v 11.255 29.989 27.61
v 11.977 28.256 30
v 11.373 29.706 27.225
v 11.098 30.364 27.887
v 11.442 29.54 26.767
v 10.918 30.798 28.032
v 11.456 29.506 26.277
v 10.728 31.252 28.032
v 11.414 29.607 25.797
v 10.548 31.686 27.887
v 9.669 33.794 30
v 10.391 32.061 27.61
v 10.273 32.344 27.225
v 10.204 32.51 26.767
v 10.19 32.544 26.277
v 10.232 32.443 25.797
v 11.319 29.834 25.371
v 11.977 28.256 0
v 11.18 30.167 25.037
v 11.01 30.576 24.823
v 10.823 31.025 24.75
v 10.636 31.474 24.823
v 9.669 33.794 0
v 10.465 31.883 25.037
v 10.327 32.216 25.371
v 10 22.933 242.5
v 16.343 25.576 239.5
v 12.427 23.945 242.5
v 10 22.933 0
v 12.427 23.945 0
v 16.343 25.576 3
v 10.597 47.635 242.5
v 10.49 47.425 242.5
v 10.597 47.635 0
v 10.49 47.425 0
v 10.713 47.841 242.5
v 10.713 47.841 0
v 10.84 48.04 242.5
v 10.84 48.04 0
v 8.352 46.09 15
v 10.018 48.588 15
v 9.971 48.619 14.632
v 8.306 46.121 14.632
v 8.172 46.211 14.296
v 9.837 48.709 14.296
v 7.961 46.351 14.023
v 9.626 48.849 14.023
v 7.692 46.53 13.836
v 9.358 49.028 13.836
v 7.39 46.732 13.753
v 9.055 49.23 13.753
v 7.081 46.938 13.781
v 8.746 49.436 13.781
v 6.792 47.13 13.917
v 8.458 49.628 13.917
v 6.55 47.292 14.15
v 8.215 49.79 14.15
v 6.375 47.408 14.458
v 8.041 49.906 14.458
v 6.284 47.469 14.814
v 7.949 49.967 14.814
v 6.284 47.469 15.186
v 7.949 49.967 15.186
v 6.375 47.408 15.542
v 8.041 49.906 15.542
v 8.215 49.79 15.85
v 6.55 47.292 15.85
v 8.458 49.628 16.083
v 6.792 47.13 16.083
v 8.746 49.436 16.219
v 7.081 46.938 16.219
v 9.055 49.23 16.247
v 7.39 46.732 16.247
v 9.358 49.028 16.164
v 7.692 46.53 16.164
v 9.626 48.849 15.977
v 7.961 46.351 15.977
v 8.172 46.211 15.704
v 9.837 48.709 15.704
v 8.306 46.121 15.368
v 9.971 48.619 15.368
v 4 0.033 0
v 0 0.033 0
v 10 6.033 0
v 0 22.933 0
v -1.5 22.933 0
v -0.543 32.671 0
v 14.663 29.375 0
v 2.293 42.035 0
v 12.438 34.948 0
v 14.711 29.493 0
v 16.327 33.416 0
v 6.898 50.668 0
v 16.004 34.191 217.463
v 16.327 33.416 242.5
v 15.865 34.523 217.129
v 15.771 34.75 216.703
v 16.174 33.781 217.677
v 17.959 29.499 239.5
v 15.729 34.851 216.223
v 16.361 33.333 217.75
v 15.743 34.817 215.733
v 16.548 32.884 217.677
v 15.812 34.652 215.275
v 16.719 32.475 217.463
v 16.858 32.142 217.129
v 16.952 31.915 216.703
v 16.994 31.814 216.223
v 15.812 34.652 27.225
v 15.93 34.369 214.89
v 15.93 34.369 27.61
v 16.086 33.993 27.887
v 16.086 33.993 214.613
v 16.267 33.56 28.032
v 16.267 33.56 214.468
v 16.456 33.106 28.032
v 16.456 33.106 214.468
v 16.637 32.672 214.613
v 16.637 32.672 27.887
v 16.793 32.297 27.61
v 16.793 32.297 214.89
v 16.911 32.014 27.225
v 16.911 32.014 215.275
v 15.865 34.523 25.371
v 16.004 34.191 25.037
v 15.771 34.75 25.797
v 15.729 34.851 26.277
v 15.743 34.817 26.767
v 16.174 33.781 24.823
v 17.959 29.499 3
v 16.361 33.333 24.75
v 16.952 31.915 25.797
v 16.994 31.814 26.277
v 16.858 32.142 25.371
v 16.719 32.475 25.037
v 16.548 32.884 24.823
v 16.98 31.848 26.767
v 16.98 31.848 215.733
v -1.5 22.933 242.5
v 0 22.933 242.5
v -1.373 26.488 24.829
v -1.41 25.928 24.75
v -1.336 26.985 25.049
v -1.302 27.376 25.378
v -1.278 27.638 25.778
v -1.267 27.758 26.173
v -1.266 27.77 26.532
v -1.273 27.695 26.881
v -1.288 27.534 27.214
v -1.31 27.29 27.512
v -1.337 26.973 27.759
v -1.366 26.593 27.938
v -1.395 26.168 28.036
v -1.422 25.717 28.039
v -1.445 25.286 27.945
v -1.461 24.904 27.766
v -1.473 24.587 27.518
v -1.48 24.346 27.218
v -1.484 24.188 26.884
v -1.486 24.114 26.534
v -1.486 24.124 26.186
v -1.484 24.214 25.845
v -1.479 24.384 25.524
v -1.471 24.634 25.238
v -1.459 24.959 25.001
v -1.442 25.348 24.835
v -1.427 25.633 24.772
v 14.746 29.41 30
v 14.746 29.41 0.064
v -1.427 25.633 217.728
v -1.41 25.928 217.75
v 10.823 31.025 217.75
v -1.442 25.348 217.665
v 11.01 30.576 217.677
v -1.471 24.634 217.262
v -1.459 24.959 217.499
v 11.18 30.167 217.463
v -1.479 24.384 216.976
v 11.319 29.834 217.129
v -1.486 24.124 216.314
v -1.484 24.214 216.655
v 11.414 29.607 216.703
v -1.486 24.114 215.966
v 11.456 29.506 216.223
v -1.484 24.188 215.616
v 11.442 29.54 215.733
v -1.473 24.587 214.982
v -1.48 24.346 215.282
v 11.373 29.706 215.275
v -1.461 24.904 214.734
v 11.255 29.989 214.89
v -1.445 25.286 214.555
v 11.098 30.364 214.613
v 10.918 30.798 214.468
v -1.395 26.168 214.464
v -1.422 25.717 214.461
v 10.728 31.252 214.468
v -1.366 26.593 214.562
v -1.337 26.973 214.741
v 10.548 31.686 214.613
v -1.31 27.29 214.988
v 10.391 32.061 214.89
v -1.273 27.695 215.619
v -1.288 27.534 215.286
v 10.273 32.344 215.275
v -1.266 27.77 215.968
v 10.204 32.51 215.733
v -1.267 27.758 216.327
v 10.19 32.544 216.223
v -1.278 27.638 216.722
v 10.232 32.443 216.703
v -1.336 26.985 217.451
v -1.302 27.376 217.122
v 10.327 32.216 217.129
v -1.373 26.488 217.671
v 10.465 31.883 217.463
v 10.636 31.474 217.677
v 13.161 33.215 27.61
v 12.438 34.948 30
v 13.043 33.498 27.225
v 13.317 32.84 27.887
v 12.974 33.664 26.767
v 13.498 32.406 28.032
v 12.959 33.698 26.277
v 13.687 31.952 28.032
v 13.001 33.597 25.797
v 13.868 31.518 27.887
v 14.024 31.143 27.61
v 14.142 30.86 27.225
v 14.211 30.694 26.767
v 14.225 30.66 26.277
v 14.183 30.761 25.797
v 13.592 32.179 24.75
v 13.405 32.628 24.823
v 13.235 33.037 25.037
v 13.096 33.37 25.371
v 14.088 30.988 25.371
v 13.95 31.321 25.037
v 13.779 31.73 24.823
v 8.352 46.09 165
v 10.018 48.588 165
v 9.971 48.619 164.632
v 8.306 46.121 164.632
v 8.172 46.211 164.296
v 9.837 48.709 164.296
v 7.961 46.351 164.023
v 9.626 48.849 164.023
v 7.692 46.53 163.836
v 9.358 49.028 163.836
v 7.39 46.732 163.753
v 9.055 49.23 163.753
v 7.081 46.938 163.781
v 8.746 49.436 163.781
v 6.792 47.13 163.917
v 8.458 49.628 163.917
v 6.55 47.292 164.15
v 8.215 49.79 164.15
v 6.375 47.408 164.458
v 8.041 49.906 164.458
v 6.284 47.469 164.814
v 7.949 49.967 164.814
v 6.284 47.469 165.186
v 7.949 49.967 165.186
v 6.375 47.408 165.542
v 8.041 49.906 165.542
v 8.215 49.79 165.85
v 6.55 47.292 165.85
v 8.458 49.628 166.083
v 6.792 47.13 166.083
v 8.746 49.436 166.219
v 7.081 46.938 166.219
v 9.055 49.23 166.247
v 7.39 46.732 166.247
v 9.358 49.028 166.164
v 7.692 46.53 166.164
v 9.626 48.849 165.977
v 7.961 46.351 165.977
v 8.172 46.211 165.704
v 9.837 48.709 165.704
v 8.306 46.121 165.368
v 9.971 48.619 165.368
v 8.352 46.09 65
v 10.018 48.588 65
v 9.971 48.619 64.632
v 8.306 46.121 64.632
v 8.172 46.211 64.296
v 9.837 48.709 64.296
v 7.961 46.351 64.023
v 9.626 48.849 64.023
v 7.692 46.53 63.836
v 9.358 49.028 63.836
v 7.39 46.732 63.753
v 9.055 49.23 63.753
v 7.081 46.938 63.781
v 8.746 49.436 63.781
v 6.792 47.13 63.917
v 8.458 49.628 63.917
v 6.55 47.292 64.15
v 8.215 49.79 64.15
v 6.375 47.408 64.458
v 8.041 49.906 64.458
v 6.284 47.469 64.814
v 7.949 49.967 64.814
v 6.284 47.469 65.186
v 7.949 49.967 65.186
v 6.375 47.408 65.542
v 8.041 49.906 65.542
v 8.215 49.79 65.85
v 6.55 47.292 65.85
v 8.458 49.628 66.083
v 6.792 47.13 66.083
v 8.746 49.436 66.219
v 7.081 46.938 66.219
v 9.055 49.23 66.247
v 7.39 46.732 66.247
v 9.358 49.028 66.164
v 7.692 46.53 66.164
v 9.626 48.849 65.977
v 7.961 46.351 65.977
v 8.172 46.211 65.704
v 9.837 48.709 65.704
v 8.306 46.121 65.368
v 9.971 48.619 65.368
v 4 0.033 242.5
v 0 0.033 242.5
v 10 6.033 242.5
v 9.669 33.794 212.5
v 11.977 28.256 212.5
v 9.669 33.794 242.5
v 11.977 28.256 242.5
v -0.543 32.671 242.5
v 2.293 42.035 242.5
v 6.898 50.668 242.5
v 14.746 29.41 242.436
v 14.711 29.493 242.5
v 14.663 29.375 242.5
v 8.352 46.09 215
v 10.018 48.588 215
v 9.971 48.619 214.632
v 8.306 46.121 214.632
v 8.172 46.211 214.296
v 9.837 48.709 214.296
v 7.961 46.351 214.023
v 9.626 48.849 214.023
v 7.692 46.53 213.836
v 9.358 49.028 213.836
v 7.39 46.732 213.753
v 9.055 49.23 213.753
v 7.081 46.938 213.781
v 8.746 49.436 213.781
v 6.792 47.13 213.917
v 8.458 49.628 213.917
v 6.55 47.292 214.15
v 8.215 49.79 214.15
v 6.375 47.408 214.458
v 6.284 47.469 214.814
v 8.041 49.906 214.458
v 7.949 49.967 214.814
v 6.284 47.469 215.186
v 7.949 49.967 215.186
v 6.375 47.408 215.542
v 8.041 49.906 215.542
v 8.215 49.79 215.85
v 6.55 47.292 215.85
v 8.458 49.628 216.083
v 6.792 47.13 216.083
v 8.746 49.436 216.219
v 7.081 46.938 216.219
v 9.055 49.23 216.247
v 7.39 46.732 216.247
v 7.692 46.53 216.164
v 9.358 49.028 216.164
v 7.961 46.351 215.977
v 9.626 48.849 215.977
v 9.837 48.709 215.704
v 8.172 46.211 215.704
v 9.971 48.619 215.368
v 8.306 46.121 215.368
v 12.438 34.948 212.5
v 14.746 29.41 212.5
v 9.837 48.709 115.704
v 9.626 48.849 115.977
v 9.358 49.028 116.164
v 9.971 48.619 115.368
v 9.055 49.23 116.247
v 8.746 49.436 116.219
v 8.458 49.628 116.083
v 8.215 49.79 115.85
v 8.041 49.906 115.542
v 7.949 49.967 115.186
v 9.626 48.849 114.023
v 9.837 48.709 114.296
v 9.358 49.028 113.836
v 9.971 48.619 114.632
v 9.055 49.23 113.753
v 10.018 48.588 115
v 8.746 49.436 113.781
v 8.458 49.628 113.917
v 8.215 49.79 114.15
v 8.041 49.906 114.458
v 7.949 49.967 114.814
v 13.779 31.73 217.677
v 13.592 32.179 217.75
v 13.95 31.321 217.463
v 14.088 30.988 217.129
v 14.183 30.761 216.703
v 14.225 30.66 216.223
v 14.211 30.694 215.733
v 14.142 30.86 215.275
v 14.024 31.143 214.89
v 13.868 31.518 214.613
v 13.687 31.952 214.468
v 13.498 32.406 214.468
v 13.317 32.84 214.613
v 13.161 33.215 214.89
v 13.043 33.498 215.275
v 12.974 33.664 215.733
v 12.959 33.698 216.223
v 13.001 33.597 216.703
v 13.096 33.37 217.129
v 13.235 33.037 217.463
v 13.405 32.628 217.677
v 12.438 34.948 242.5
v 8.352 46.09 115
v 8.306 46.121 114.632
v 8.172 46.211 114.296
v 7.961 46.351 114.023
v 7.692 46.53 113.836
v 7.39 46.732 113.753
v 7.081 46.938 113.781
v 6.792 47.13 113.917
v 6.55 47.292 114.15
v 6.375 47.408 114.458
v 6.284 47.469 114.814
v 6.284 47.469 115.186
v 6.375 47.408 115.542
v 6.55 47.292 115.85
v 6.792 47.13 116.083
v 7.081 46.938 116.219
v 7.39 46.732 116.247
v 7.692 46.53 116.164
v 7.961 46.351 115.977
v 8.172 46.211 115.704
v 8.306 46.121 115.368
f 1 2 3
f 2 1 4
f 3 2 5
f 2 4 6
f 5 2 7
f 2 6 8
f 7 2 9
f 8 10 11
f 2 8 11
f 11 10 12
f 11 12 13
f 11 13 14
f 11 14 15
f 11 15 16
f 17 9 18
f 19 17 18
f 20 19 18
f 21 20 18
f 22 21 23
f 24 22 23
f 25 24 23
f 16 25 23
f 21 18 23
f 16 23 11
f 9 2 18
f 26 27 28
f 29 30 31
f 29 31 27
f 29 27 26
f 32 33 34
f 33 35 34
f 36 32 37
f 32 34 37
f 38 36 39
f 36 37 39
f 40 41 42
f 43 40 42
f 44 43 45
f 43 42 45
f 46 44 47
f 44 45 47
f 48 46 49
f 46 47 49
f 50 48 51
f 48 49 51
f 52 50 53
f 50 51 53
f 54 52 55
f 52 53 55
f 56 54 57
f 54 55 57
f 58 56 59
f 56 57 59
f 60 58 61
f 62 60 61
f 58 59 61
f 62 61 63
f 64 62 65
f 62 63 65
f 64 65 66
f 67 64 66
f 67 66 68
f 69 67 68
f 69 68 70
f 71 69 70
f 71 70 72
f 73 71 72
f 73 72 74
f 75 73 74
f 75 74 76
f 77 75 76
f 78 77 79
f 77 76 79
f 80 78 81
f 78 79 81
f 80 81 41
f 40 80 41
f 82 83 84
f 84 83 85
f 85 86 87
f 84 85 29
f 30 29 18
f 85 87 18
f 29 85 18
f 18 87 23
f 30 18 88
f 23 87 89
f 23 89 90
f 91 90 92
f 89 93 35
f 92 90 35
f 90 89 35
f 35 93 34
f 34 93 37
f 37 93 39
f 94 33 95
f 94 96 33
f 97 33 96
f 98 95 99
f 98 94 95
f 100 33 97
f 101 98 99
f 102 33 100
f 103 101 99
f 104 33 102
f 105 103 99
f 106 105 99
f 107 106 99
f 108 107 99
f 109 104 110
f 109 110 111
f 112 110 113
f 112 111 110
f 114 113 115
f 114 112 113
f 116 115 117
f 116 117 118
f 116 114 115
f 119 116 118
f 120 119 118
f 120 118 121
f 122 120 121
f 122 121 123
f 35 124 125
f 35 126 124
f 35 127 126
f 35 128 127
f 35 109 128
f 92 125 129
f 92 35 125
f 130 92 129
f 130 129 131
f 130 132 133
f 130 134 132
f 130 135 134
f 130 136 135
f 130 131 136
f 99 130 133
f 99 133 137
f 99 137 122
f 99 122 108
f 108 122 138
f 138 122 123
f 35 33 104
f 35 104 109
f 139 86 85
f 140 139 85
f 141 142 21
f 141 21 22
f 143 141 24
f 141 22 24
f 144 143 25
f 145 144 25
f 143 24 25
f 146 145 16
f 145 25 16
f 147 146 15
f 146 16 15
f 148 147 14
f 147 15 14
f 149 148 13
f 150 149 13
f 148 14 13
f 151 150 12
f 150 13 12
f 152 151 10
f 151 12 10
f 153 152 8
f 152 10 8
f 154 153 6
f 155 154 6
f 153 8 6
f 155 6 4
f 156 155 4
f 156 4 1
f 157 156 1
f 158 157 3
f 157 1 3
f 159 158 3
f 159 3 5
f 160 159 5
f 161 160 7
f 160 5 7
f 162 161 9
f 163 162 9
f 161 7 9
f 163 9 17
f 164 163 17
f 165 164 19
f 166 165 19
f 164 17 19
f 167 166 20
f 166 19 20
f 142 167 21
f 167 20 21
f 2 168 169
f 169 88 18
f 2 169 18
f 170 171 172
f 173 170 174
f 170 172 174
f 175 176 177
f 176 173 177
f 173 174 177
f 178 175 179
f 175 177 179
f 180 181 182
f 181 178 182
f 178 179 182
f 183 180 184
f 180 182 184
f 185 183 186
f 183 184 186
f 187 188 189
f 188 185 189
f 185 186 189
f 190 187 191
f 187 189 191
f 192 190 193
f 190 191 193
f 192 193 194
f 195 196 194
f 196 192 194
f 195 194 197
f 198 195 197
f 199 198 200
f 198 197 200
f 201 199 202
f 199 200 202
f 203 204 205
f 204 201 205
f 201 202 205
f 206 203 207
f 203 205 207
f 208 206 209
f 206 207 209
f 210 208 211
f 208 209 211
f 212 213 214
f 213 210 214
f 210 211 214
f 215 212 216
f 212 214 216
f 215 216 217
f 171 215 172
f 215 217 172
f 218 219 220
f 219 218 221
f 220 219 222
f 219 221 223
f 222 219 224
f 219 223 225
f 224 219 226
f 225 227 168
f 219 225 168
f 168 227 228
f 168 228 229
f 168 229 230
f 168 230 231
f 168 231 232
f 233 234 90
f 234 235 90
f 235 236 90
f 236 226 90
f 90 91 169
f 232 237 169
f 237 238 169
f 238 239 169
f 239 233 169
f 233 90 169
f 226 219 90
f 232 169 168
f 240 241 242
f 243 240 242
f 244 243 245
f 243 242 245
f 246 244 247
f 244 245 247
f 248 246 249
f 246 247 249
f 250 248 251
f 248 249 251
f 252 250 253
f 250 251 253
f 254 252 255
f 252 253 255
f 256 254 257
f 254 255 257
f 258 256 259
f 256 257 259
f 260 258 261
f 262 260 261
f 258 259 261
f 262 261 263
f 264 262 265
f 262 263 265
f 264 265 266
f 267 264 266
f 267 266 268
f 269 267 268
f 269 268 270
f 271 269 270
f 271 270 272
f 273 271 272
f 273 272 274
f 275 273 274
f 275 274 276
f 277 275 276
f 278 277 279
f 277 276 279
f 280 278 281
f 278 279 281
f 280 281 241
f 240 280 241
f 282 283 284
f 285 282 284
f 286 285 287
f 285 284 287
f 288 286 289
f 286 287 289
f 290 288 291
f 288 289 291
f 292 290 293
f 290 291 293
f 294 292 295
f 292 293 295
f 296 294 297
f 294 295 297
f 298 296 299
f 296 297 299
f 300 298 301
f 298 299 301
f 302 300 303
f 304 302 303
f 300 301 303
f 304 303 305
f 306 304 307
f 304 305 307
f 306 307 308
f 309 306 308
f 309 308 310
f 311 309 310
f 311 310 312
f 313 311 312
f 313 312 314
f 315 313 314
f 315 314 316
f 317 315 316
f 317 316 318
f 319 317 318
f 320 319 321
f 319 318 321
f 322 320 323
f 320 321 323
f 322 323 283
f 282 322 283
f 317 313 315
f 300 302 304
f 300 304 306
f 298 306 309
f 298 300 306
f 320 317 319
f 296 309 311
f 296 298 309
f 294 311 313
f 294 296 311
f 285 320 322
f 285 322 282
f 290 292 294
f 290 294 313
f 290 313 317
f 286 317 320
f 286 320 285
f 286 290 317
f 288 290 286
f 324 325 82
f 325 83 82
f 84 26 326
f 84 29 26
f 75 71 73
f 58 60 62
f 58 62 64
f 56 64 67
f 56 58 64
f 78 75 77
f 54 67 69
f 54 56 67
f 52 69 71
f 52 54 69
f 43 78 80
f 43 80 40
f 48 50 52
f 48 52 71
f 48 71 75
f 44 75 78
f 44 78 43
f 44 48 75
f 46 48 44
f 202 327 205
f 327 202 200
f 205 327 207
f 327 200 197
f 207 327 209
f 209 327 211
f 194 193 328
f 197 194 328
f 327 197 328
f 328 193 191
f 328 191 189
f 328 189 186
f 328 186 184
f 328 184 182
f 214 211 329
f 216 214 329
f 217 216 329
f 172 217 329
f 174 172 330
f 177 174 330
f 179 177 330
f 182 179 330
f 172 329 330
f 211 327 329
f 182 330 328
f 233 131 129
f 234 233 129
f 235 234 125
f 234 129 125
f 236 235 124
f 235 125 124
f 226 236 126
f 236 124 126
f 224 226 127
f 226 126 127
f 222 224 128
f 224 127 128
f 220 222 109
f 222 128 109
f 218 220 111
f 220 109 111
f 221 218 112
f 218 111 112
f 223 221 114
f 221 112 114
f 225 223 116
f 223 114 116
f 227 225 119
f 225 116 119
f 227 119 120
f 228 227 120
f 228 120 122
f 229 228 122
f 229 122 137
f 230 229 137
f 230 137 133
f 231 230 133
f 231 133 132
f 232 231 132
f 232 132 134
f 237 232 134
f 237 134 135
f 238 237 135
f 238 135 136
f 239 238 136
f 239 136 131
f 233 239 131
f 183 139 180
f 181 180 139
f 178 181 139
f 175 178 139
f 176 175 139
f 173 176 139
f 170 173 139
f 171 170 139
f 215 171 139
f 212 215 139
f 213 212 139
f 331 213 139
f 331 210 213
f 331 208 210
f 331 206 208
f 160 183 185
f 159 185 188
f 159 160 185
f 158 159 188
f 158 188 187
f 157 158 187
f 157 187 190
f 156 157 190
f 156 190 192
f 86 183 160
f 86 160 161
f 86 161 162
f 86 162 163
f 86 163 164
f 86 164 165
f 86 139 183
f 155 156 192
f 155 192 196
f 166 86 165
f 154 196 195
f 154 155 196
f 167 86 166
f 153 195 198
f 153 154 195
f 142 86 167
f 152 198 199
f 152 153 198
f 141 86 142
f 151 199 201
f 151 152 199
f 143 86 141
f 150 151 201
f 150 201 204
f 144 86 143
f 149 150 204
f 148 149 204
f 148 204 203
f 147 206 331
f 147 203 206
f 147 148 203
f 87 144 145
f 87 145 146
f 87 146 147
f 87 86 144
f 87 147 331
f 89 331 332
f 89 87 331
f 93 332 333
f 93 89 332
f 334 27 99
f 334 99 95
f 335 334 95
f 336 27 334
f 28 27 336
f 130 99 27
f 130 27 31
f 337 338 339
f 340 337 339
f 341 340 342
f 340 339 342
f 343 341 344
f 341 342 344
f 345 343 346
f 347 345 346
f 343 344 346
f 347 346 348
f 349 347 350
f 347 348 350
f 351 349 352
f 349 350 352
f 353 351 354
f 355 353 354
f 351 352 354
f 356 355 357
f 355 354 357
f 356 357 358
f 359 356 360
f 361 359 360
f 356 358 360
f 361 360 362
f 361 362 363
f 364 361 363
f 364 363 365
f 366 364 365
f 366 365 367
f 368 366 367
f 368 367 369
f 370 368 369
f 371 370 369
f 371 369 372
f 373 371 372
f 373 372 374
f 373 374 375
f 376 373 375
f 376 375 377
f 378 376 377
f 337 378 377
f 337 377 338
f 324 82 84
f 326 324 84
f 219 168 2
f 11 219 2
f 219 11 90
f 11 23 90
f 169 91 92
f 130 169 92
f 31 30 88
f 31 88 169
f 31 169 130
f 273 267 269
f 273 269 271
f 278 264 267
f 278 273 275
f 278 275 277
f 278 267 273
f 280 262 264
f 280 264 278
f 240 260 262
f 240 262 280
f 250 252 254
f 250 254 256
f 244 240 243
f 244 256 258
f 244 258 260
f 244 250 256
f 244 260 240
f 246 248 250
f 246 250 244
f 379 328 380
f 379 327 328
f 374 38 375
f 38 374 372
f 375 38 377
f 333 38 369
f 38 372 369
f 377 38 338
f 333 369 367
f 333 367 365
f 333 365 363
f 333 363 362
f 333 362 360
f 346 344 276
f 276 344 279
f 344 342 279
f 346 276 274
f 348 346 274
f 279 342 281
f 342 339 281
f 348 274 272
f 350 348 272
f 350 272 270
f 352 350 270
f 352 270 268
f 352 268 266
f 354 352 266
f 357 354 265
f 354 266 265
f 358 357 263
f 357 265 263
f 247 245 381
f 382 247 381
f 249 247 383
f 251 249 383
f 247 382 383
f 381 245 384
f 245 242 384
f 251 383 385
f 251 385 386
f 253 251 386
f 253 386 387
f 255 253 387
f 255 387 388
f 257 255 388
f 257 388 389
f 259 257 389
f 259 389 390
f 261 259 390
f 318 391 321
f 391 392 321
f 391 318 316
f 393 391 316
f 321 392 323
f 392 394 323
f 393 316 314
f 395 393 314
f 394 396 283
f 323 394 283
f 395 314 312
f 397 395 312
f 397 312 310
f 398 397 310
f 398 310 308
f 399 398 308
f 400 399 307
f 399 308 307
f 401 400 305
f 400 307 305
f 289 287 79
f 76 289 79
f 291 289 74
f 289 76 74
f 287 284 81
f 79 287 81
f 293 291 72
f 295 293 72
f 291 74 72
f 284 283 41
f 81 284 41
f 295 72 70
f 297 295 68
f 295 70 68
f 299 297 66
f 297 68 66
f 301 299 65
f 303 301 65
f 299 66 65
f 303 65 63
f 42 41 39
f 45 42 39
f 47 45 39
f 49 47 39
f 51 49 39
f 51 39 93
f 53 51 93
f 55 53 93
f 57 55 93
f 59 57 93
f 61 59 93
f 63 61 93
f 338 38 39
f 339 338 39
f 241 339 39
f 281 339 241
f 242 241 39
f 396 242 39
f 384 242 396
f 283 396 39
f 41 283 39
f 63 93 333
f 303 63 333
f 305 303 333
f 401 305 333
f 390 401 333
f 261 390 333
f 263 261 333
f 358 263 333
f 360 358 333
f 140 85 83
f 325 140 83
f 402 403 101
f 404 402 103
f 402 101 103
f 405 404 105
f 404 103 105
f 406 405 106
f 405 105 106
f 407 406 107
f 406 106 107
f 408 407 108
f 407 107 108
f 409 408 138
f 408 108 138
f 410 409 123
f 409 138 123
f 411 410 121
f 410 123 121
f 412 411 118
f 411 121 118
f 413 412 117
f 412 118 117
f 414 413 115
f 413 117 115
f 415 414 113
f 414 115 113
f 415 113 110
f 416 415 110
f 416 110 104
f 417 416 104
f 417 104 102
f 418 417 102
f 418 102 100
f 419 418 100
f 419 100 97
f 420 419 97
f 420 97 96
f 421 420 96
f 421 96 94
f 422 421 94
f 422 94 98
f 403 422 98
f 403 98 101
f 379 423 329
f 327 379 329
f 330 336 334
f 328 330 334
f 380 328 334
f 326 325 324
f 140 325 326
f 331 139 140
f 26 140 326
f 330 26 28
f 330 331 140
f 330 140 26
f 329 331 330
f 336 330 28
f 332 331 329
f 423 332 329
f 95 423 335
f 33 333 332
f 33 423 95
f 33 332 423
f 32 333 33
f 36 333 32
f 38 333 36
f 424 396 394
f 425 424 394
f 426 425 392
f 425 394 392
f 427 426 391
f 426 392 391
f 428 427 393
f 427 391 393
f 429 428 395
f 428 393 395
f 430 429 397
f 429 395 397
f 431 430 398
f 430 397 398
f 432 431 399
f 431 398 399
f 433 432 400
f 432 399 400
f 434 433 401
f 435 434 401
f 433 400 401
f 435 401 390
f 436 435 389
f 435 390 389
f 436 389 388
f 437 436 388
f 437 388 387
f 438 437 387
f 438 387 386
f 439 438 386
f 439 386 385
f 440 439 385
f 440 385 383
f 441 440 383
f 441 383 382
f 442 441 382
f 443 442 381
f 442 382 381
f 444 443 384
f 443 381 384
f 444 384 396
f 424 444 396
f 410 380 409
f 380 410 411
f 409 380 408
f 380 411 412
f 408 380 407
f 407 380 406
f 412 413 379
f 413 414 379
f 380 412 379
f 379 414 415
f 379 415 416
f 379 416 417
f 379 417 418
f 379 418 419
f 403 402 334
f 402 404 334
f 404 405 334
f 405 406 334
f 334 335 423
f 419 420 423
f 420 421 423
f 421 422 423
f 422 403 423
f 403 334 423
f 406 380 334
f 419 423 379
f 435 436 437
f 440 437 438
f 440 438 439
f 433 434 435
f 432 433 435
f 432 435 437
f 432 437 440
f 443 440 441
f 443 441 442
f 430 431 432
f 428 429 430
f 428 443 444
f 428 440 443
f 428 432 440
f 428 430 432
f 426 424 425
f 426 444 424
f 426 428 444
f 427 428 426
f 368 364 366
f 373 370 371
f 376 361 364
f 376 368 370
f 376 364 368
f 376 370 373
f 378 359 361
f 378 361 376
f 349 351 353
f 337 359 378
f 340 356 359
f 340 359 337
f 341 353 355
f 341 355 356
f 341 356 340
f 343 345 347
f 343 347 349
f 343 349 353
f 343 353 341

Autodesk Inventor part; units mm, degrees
ref_plane "YZ Plane" through (0, 0, 0) normal (1, 0, 0) x (0, 1, 0)
ref_plane "Work Plane1" through (0, 0, 0) normal (0, 0, 1) x (1, 0, 0)
sketch "Sketch1" plane through (0, 0, 0) normal (0, 0, 1) x (1, 0, 0)
  line L0 (10, 0) -> (-1.5, 0) projected
  line L1 (10, 45.2667) -> (10, 0) projected
  arc A0 (13.0769, 49.8821) -> (10, 45.2667) centre (15, 45.2667) ccw projected
  line L2 (54.8615, 67.2923) -> (13.0769, 49.8821) projected
  line L3 (50.4385, 77.9077) -> (54.8615, 67.2923) projected
  line L4 (50.4385, 77.9077) -> (29.2692, 69.0872) projected
  arc A1 (29.2692, 69.0872) -> (-1.5, 22.9333) centre (48.5, 22.9333) ccw projected
  line L5 (-1.5, 0) -> (-1.5, 22.9333) projected
  line L6 (15, 45.2667) -> (6.8975, 50.6683)
  line L7 (10, 48.6) -> (19.7692, 25.1538) projected
  line L8 (35.4, 31.6667) -> (10, 21.0833) projected
  line L9 (19.1124, 26.7302) -> (10, 22.9333)
  line L10 (-1.5, 22.9333) -> (10, 22.9333)
  line L11 (-1.5, 22.9333) -> (0, 22.9333)
  line L12 (0, 22.9333) -> (0, -23.4445)
  line L13 (0, -23.4445) -> (-1.5, -23.4445)
  line L14 (-1.5, -23.4445) -> (-1.5, 22.9333)
  line L15 (0, 0.0333) -> (4, 0.0333)
  line L16 (4, 0.0333) -> (10, 6.0333)
  point P0 (0, 0)
  point P1 (10.4897, 47.4247)
  point P2 (10.8397, 48.0402)
  point P3 (10, 48.6)
  point P4 (0, 22.9333)
  dimension "d3" = 1.5
  dimension "d4" = 4
  dimension "d5" = 45
  dimension "d6" = 22.9
extrude "Extrusion1" add sketch "Sketch1" along normal blind 242.5 contours L16 L15 L12 L10 L1 | A1 L6 L7 A0 L1 L10 | L1 A0 L7 L9 | L6 A0 L7
sketch "Sketch2" plane through (6.8975, 50.6683, 242.5) normal (0.5547002, 0.8320503, 0) x (0.8320503, -0.5547002, 0)
  line L0 (4.738, 242.5) -> (0, 242.5) projected
  line L1 (0, 242.5) -> (0, 0) projected
  line L2 (4.738, 0) -> (0, 0) projected
  line L3 (4.738, 242.5) -> (4.738, 0) projected
  circle A0 centre (2.5, 227.5) radius 1.25
  circle A1 centre (2.5, 177.5) radius 1.25
  circle A2 centre (2.5, 127.5) radius 1.25
  circle A3 centre (2.5, 77.5) radius 1.25
  circle A4 centre (2.5, 27.5) radius 1.25
  point P0 (22.3667, 242.5)
  dimension "d7" = 2.5
  dimension "d8" = 2.5
  dimension "d9" = 15
  dimension "d12" = 50
extrude "Extrusion2" cut sketch "Sketch2" against normal blind 3 contours A0 | A1 | A2 | A3 | A4
sketch "Sketch3" plane through (0, 0, 0) normal (0, 0, -1) x (-1, 0, 0)
  line L0 (-10, 6.0333) -> (-10, 22.9333) projected
  line L1 (-4, 0.0333) -> (-10, 6.0333) projected
  line L2 (0, 0.0333) -> (-4, 0.0333) projected
  line L3 (0, 22.9333) -> (0, 0.0333) projected
  line L4 (1.5, 22.9333) -> (0, 22.9333) projected
  arc A0 (1.5, 22.9333) -> (-6.8975, 50.6683) centre (-48.5, 22.9333) ccw projected
  line L5 (-10.8397, 48.0402) -> (-6.8975, 50.6683) projected
  arc A1 (-10.4897, 47.4247) -> (-10.8397, 48.0402) centre (-15, 45.2667) ccw projected
  line L6 (-19.1124, 26.7302) -> (-10.4897, 47.4247) projected
  line L7 (-10, 22.9333) -> (-19.1124, 26.7302) projected
  line L8 (-12.4384, 34.9479) -> (-14.7461, 29.4095)
  line L9 (-14.7461, 29.4095) -> (-11.9768, 28.2556)
  line L10 (-11.9768, 28.2556) -> (-9.6691, 33.7941)
  line L11 (-9.6691, 33.7941) -> (-12.4384, 34.9479)
  point P0 (0, 0)
  dimension "d19" = 12.7
  dimension "d20" = 6
  dimension "d21" = 3
  dimension "d22" = 3
extrude "Extrusion3" cut sketch "Sketch3" against normal blind 30 contours L11 L10 L9 L8
sketch "Sketch4" plane through (10.4897, 47.4247, 242.5) normal (0.9230769, 0.3846154, 0) x (0, 0, -1)
  line L0 (242.5, -22.4191) -> (242.5, 0) projected
  line L1 (242.5, 0) -> (0, 0) projected
  line L2 (0, -22.4191) -> (0, 0) projected
  line L3 (242.5, -22.4191) -> (0, -22.4191) projected
  line L4 (242.5, -18.2665) -> (242.5, -12.2665) construction
  line L5 (242.5, -18.2665) -> (212.5, -18.2665) projected
  line L6 (212.5, -18.2665) -> (212.5, -12.2665) projected
  line L7 (242.5, -12.2665) -> (212.5, -12.2665) projected
  circle A0 centre (216.1, -15.2665) radius 1.65
  line L8 (217.7743, -18.1665) -> (214.4257, -18.1665)
  line L9 (214.4257, -18.1665) -> (212.7514, -15.2665)
  line L10 (212.7514, -15.2665) -> (214.4257, -12.3665)
  line L11 (214.4257, -12.3665) -> (217.7743, -12.3665)
  line L12 (217.7743, -12.3665) -> (219.4486, -15.2665)
  line L13 (219.4486, -15.2665) -> (217.7743, -18.1665)
  point P0 (242.5, -39.7422)
  point P1 (212.5, -15.2665)
  dimension "d25" = 3.3
  dimension "d26" = 3.6
  dimension "d27" = 5.8
extrude "Extrusion4" cut sketch "Sketch4" against normal through all contours A0
ref_plane "Work Plane2" through (0, 0, 121.25) normal (0, 0, 1) x (1, 0, 0)
mirror "Mirror1" about plane through (0, 0, 121.25) normal (0, 0, 1) of "Extrusion4", "Extrusion3"
chamfer "Chamfer1" distance 3 angle 45 1 edges at (19.1124, 26.7302, 121.25)
chamfer "Chamfer2" distance 3 angle 45 2 edges at (17.1509, 27.5379, 0) (17.1509, 27.5379, 242.5)
properties part number "ESQUINA_REDONDEADA_R50_P2"
